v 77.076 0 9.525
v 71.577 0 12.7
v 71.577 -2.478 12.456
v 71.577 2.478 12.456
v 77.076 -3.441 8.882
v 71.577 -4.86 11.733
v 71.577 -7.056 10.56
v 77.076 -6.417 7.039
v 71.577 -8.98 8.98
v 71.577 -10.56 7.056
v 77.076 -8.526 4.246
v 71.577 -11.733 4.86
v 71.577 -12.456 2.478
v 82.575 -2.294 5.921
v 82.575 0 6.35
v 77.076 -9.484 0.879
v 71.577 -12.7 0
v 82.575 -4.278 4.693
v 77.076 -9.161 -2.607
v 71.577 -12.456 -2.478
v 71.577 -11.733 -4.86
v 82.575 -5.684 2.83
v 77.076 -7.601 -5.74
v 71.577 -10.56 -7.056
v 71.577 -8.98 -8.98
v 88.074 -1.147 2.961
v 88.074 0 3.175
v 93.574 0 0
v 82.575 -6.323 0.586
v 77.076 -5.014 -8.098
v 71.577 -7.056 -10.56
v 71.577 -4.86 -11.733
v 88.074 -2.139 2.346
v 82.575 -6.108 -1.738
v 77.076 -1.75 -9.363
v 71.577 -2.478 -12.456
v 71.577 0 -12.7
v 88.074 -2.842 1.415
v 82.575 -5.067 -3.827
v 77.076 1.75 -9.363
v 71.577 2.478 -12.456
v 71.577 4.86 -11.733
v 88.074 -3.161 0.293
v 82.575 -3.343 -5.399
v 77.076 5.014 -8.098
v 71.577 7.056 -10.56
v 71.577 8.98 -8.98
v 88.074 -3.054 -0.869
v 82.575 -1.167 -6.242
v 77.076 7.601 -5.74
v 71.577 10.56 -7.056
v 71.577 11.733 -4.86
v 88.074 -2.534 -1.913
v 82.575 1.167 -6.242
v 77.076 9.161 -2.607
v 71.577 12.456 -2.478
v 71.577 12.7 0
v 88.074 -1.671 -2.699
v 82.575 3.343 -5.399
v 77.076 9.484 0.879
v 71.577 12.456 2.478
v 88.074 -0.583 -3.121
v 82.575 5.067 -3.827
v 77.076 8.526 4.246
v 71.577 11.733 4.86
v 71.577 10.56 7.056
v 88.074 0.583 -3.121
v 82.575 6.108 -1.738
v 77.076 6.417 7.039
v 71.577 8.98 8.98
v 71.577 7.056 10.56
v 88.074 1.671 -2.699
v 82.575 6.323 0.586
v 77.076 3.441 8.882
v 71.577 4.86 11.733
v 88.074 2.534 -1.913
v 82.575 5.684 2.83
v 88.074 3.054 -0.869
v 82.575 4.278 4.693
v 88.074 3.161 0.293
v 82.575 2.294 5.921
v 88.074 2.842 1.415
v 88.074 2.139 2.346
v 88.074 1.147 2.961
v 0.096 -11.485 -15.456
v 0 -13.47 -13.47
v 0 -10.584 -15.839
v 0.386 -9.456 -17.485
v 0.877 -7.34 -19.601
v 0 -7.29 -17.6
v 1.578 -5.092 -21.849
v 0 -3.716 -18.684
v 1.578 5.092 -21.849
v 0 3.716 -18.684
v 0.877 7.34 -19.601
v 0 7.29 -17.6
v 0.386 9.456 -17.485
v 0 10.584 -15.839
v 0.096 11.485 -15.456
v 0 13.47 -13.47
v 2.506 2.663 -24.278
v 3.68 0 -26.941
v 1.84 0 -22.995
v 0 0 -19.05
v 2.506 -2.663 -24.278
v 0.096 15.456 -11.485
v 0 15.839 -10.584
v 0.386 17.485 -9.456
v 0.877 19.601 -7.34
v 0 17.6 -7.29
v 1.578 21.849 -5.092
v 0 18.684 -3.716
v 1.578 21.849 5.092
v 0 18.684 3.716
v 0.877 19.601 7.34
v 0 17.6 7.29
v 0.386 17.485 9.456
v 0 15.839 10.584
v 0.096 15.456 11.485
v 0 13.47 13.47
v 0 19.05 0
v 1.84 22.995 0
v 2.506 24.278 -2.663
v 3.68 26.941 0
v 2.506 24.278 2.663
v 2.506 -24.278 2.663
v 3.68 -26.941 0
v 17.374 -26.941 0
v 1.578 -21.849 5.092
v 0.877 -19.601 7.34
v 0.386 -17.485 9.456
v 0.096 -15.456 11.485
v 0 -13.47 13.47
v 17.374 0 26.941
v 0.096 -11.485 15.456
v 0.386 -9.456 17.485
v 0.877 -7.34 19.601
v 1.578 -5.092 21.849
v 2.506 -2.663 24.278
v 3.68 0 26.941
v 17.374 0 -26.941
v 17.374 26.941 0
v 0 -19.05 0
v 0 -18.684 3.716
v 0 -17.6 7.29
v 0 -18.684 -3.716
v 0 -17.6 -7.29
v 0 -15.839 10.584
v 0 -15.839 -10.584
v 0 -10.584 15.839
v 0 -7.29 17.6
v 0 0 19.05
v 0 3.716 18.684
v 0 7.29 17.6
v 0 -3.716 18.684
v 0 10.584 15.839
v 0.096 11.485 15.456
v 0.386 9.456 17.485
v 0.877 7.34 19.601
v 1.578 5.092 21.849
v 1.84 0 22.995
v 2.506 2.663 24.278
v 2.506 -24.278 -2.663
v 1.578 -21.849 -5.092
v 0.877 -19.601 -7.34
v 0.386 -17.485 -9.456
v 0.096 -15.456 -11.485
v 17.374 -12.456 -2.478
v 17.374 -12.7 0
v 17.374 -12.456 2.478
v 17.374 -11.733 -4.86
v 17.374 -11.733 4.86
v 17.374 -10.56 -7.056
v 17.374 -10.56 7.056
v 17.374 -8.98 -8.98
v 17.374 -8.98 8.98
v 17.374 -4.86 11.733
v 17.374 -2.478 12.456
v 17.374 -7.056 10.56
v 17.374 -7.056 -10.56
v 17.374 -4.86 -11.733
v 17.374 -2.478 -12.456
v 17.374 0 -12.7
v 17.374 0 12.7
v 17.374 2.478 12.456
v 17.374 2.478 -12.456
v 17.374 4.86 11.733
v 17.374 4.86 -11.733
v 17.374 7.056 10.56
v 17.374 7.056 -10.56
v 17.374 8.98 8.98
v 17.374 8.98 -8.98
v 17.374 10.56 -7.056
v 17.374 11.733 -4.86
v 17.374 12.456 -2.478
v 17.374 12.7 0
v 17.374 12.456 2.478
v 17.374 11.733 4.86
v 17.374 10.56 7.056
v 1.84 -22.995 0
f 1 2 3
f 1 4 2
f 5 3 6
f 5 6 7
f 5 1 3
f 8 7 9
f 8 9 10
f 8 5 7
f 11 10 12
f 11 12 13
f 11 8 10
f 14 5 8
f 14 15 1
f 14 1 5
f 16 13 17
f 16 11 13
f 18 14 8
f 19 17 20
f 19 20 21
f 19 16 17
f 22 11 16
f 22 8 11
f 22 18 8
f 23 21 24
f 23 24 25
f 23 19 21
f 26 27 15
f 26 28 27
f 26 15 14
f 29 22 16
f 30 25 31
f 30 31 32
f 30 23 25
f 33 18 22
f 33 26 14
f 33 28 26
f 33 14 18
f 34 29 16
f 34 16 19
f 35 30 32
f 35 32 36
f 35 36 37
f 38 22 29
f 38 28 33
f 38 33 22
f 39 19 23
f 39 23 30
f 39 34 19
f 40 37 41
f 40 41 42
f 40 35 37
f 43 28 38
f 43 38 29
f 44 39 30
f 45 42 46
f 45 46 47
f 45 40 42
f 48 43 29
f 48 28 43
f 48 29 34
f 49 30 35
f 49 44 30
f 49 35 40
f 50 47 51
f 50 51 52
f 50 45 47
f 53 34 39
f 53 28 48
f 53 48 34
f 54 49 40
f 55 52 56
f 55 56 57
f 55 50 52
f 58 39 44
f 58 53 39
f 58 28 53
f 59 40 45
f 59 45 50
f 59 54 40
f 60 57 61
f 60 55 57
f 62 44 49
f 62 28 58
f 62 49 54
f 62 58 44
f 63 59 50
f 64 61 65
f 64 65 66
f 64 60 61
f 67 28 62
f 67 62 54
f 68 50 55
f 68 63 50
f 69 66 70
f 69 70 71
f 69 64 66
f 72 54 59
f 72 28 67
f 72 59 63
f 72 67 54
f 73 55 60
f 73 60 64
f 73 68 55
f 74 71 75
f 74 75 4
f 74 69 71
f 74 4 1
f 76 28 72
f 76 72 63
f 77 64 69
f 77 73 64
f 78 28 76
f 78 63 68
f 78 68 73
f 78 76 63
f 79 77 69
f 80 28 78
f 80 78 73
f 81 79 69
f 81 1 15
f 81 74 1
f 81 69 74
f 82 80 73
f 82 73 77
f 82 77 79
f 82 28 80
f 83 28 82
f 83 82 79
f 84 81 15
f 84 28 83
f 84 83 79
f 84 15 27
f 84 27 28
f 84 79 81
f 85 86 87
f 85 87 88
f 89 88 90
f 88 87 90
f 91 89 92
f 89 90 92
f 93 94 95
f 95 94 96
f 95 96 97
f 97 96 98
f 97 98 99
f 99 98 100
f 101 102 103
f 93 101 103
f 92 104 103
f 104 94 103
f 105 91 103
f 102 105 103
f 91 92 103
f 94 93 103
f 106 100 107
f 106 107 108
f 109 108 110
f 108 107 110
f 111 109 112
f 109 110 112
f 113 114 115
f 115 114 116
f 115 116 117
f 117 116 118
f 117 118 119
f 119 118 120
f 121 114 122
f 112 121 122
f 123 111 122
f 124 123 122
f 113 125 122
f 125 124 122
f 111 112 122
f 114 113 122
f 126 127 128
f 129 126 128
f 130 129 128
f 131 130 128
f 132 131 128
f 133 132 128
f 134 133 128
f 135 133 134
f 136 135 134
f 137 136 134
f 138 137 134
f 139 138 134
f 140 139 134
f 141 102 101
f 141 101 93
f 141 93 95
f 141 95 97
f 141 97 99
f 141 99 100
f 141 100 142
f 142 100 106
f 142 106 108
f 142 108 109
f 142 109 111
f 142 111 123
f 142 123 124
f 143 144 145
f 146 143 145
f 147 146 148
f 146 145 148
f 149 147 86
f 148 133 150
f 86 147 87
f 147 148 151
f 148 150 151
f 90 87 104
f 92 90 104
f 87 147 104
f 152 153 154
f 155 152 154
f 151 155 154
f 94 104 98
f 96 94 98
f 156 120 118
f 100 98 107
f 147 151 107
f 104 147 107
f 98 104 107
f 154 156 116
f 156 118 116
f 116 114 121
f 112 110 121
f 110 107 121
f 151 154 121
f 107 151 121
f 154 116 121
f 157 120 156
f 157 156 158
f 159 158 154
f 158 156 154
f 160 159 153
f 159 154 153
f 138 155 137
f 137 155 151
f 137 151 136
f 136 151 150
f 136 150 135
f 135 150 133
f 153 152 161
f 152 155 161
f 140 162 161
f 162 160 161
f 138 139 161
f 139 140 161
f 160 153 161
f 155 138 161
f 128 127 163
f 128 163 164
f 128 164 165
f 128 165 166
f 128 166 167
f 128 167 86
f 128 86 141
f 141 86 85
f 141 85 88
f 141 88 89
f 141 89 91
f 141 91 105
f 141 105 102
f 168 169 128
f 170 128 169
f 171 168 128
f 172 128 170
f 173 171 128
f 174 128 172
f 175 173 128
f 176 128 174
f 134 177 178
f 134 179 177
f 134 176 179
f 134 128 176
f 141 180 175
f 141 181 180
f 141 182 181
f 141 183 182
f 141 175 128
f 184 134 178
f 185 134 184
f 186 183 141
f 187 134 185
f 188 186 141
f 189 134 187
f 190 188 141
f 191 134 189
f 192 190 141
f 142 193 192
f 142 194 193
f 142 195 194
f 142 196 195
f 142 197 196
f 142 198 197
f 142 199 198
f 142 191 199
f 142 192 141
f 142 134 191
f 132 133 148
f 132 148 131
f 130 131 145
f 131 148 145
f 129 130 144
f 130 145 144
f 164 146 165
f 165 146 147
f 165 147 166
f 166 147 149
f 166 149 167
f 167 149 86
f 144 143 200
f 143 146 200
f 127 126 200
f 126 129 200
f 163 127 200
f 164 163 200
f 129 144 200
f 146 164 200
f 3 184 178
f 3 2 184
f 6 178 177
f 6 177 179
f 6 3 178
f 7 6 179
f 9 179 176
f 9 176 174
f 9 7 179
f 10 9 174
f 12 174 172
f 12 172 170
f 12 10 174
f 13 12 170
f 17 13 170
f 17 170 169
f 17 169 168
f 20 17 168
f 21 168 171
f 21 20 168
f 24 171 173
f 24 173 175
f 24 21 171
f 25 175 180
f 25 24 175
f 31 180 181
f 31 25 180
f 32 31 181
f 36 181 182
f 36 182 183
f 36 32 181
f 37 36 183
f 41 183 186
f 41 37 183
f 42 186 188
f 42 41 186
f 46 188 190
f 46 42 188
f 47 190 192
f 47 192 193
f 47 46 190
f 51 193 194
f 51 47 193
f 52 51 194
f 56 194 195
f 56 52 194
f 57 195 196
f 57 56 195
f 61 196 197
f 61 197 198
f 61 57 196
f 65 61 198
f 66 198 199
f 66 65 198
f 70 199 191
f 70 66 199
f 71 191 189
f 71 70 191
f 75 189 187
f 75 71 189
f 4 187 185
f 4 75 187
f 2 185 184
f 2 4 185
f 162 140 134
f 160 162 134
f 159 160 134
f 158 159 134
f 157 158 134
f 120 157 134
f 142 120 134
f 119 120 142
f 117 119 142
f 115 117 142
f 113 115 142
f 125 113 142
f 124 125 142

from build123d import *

# Parameters (mm, degrees)
SKETCH1_W      = 38.1
SKETCH1_H      = 38.1
BASEHEAD_DEPTH = 17.3736


with BuildPart() as part:
    # Sketch1 → BaseHead (new body)
    with BuildSketch(Plane(origin=(0, 0, 0), x_dir=(0, 0.7071067811865488, -0.7071067811865462), z_dir=(1, 0, 0))):
        Rectangle(SKETCH1_W, SKETCH1_H)
    extrude(amount=BASEHEAD_DEPTH)

    # Sketch2 → Body (revolve)
    with BuildSketch(Plane.XY):
        Polygon((17.3736, 0), (17.3736, 12.7), (71.576554744, 12.7), (93.5736, 0), align=None)
    revolve(axis=Axis((0, 0, 0), (1, 0, 0)))

    # Sketch3 → HeadChamfer (revolve, cut)
    with BuildSketch(Plane.XY):
        Polygon((0, 19.05), (-12.7, 19.05), (-12.7, 52.340768363), (15.523740234, 52.340768363), align=None)
    revolve(axis=Axis((0, 0, 0), (1, 0, 0)), mode=Mode.SUBTRACT)


solid = part.part
